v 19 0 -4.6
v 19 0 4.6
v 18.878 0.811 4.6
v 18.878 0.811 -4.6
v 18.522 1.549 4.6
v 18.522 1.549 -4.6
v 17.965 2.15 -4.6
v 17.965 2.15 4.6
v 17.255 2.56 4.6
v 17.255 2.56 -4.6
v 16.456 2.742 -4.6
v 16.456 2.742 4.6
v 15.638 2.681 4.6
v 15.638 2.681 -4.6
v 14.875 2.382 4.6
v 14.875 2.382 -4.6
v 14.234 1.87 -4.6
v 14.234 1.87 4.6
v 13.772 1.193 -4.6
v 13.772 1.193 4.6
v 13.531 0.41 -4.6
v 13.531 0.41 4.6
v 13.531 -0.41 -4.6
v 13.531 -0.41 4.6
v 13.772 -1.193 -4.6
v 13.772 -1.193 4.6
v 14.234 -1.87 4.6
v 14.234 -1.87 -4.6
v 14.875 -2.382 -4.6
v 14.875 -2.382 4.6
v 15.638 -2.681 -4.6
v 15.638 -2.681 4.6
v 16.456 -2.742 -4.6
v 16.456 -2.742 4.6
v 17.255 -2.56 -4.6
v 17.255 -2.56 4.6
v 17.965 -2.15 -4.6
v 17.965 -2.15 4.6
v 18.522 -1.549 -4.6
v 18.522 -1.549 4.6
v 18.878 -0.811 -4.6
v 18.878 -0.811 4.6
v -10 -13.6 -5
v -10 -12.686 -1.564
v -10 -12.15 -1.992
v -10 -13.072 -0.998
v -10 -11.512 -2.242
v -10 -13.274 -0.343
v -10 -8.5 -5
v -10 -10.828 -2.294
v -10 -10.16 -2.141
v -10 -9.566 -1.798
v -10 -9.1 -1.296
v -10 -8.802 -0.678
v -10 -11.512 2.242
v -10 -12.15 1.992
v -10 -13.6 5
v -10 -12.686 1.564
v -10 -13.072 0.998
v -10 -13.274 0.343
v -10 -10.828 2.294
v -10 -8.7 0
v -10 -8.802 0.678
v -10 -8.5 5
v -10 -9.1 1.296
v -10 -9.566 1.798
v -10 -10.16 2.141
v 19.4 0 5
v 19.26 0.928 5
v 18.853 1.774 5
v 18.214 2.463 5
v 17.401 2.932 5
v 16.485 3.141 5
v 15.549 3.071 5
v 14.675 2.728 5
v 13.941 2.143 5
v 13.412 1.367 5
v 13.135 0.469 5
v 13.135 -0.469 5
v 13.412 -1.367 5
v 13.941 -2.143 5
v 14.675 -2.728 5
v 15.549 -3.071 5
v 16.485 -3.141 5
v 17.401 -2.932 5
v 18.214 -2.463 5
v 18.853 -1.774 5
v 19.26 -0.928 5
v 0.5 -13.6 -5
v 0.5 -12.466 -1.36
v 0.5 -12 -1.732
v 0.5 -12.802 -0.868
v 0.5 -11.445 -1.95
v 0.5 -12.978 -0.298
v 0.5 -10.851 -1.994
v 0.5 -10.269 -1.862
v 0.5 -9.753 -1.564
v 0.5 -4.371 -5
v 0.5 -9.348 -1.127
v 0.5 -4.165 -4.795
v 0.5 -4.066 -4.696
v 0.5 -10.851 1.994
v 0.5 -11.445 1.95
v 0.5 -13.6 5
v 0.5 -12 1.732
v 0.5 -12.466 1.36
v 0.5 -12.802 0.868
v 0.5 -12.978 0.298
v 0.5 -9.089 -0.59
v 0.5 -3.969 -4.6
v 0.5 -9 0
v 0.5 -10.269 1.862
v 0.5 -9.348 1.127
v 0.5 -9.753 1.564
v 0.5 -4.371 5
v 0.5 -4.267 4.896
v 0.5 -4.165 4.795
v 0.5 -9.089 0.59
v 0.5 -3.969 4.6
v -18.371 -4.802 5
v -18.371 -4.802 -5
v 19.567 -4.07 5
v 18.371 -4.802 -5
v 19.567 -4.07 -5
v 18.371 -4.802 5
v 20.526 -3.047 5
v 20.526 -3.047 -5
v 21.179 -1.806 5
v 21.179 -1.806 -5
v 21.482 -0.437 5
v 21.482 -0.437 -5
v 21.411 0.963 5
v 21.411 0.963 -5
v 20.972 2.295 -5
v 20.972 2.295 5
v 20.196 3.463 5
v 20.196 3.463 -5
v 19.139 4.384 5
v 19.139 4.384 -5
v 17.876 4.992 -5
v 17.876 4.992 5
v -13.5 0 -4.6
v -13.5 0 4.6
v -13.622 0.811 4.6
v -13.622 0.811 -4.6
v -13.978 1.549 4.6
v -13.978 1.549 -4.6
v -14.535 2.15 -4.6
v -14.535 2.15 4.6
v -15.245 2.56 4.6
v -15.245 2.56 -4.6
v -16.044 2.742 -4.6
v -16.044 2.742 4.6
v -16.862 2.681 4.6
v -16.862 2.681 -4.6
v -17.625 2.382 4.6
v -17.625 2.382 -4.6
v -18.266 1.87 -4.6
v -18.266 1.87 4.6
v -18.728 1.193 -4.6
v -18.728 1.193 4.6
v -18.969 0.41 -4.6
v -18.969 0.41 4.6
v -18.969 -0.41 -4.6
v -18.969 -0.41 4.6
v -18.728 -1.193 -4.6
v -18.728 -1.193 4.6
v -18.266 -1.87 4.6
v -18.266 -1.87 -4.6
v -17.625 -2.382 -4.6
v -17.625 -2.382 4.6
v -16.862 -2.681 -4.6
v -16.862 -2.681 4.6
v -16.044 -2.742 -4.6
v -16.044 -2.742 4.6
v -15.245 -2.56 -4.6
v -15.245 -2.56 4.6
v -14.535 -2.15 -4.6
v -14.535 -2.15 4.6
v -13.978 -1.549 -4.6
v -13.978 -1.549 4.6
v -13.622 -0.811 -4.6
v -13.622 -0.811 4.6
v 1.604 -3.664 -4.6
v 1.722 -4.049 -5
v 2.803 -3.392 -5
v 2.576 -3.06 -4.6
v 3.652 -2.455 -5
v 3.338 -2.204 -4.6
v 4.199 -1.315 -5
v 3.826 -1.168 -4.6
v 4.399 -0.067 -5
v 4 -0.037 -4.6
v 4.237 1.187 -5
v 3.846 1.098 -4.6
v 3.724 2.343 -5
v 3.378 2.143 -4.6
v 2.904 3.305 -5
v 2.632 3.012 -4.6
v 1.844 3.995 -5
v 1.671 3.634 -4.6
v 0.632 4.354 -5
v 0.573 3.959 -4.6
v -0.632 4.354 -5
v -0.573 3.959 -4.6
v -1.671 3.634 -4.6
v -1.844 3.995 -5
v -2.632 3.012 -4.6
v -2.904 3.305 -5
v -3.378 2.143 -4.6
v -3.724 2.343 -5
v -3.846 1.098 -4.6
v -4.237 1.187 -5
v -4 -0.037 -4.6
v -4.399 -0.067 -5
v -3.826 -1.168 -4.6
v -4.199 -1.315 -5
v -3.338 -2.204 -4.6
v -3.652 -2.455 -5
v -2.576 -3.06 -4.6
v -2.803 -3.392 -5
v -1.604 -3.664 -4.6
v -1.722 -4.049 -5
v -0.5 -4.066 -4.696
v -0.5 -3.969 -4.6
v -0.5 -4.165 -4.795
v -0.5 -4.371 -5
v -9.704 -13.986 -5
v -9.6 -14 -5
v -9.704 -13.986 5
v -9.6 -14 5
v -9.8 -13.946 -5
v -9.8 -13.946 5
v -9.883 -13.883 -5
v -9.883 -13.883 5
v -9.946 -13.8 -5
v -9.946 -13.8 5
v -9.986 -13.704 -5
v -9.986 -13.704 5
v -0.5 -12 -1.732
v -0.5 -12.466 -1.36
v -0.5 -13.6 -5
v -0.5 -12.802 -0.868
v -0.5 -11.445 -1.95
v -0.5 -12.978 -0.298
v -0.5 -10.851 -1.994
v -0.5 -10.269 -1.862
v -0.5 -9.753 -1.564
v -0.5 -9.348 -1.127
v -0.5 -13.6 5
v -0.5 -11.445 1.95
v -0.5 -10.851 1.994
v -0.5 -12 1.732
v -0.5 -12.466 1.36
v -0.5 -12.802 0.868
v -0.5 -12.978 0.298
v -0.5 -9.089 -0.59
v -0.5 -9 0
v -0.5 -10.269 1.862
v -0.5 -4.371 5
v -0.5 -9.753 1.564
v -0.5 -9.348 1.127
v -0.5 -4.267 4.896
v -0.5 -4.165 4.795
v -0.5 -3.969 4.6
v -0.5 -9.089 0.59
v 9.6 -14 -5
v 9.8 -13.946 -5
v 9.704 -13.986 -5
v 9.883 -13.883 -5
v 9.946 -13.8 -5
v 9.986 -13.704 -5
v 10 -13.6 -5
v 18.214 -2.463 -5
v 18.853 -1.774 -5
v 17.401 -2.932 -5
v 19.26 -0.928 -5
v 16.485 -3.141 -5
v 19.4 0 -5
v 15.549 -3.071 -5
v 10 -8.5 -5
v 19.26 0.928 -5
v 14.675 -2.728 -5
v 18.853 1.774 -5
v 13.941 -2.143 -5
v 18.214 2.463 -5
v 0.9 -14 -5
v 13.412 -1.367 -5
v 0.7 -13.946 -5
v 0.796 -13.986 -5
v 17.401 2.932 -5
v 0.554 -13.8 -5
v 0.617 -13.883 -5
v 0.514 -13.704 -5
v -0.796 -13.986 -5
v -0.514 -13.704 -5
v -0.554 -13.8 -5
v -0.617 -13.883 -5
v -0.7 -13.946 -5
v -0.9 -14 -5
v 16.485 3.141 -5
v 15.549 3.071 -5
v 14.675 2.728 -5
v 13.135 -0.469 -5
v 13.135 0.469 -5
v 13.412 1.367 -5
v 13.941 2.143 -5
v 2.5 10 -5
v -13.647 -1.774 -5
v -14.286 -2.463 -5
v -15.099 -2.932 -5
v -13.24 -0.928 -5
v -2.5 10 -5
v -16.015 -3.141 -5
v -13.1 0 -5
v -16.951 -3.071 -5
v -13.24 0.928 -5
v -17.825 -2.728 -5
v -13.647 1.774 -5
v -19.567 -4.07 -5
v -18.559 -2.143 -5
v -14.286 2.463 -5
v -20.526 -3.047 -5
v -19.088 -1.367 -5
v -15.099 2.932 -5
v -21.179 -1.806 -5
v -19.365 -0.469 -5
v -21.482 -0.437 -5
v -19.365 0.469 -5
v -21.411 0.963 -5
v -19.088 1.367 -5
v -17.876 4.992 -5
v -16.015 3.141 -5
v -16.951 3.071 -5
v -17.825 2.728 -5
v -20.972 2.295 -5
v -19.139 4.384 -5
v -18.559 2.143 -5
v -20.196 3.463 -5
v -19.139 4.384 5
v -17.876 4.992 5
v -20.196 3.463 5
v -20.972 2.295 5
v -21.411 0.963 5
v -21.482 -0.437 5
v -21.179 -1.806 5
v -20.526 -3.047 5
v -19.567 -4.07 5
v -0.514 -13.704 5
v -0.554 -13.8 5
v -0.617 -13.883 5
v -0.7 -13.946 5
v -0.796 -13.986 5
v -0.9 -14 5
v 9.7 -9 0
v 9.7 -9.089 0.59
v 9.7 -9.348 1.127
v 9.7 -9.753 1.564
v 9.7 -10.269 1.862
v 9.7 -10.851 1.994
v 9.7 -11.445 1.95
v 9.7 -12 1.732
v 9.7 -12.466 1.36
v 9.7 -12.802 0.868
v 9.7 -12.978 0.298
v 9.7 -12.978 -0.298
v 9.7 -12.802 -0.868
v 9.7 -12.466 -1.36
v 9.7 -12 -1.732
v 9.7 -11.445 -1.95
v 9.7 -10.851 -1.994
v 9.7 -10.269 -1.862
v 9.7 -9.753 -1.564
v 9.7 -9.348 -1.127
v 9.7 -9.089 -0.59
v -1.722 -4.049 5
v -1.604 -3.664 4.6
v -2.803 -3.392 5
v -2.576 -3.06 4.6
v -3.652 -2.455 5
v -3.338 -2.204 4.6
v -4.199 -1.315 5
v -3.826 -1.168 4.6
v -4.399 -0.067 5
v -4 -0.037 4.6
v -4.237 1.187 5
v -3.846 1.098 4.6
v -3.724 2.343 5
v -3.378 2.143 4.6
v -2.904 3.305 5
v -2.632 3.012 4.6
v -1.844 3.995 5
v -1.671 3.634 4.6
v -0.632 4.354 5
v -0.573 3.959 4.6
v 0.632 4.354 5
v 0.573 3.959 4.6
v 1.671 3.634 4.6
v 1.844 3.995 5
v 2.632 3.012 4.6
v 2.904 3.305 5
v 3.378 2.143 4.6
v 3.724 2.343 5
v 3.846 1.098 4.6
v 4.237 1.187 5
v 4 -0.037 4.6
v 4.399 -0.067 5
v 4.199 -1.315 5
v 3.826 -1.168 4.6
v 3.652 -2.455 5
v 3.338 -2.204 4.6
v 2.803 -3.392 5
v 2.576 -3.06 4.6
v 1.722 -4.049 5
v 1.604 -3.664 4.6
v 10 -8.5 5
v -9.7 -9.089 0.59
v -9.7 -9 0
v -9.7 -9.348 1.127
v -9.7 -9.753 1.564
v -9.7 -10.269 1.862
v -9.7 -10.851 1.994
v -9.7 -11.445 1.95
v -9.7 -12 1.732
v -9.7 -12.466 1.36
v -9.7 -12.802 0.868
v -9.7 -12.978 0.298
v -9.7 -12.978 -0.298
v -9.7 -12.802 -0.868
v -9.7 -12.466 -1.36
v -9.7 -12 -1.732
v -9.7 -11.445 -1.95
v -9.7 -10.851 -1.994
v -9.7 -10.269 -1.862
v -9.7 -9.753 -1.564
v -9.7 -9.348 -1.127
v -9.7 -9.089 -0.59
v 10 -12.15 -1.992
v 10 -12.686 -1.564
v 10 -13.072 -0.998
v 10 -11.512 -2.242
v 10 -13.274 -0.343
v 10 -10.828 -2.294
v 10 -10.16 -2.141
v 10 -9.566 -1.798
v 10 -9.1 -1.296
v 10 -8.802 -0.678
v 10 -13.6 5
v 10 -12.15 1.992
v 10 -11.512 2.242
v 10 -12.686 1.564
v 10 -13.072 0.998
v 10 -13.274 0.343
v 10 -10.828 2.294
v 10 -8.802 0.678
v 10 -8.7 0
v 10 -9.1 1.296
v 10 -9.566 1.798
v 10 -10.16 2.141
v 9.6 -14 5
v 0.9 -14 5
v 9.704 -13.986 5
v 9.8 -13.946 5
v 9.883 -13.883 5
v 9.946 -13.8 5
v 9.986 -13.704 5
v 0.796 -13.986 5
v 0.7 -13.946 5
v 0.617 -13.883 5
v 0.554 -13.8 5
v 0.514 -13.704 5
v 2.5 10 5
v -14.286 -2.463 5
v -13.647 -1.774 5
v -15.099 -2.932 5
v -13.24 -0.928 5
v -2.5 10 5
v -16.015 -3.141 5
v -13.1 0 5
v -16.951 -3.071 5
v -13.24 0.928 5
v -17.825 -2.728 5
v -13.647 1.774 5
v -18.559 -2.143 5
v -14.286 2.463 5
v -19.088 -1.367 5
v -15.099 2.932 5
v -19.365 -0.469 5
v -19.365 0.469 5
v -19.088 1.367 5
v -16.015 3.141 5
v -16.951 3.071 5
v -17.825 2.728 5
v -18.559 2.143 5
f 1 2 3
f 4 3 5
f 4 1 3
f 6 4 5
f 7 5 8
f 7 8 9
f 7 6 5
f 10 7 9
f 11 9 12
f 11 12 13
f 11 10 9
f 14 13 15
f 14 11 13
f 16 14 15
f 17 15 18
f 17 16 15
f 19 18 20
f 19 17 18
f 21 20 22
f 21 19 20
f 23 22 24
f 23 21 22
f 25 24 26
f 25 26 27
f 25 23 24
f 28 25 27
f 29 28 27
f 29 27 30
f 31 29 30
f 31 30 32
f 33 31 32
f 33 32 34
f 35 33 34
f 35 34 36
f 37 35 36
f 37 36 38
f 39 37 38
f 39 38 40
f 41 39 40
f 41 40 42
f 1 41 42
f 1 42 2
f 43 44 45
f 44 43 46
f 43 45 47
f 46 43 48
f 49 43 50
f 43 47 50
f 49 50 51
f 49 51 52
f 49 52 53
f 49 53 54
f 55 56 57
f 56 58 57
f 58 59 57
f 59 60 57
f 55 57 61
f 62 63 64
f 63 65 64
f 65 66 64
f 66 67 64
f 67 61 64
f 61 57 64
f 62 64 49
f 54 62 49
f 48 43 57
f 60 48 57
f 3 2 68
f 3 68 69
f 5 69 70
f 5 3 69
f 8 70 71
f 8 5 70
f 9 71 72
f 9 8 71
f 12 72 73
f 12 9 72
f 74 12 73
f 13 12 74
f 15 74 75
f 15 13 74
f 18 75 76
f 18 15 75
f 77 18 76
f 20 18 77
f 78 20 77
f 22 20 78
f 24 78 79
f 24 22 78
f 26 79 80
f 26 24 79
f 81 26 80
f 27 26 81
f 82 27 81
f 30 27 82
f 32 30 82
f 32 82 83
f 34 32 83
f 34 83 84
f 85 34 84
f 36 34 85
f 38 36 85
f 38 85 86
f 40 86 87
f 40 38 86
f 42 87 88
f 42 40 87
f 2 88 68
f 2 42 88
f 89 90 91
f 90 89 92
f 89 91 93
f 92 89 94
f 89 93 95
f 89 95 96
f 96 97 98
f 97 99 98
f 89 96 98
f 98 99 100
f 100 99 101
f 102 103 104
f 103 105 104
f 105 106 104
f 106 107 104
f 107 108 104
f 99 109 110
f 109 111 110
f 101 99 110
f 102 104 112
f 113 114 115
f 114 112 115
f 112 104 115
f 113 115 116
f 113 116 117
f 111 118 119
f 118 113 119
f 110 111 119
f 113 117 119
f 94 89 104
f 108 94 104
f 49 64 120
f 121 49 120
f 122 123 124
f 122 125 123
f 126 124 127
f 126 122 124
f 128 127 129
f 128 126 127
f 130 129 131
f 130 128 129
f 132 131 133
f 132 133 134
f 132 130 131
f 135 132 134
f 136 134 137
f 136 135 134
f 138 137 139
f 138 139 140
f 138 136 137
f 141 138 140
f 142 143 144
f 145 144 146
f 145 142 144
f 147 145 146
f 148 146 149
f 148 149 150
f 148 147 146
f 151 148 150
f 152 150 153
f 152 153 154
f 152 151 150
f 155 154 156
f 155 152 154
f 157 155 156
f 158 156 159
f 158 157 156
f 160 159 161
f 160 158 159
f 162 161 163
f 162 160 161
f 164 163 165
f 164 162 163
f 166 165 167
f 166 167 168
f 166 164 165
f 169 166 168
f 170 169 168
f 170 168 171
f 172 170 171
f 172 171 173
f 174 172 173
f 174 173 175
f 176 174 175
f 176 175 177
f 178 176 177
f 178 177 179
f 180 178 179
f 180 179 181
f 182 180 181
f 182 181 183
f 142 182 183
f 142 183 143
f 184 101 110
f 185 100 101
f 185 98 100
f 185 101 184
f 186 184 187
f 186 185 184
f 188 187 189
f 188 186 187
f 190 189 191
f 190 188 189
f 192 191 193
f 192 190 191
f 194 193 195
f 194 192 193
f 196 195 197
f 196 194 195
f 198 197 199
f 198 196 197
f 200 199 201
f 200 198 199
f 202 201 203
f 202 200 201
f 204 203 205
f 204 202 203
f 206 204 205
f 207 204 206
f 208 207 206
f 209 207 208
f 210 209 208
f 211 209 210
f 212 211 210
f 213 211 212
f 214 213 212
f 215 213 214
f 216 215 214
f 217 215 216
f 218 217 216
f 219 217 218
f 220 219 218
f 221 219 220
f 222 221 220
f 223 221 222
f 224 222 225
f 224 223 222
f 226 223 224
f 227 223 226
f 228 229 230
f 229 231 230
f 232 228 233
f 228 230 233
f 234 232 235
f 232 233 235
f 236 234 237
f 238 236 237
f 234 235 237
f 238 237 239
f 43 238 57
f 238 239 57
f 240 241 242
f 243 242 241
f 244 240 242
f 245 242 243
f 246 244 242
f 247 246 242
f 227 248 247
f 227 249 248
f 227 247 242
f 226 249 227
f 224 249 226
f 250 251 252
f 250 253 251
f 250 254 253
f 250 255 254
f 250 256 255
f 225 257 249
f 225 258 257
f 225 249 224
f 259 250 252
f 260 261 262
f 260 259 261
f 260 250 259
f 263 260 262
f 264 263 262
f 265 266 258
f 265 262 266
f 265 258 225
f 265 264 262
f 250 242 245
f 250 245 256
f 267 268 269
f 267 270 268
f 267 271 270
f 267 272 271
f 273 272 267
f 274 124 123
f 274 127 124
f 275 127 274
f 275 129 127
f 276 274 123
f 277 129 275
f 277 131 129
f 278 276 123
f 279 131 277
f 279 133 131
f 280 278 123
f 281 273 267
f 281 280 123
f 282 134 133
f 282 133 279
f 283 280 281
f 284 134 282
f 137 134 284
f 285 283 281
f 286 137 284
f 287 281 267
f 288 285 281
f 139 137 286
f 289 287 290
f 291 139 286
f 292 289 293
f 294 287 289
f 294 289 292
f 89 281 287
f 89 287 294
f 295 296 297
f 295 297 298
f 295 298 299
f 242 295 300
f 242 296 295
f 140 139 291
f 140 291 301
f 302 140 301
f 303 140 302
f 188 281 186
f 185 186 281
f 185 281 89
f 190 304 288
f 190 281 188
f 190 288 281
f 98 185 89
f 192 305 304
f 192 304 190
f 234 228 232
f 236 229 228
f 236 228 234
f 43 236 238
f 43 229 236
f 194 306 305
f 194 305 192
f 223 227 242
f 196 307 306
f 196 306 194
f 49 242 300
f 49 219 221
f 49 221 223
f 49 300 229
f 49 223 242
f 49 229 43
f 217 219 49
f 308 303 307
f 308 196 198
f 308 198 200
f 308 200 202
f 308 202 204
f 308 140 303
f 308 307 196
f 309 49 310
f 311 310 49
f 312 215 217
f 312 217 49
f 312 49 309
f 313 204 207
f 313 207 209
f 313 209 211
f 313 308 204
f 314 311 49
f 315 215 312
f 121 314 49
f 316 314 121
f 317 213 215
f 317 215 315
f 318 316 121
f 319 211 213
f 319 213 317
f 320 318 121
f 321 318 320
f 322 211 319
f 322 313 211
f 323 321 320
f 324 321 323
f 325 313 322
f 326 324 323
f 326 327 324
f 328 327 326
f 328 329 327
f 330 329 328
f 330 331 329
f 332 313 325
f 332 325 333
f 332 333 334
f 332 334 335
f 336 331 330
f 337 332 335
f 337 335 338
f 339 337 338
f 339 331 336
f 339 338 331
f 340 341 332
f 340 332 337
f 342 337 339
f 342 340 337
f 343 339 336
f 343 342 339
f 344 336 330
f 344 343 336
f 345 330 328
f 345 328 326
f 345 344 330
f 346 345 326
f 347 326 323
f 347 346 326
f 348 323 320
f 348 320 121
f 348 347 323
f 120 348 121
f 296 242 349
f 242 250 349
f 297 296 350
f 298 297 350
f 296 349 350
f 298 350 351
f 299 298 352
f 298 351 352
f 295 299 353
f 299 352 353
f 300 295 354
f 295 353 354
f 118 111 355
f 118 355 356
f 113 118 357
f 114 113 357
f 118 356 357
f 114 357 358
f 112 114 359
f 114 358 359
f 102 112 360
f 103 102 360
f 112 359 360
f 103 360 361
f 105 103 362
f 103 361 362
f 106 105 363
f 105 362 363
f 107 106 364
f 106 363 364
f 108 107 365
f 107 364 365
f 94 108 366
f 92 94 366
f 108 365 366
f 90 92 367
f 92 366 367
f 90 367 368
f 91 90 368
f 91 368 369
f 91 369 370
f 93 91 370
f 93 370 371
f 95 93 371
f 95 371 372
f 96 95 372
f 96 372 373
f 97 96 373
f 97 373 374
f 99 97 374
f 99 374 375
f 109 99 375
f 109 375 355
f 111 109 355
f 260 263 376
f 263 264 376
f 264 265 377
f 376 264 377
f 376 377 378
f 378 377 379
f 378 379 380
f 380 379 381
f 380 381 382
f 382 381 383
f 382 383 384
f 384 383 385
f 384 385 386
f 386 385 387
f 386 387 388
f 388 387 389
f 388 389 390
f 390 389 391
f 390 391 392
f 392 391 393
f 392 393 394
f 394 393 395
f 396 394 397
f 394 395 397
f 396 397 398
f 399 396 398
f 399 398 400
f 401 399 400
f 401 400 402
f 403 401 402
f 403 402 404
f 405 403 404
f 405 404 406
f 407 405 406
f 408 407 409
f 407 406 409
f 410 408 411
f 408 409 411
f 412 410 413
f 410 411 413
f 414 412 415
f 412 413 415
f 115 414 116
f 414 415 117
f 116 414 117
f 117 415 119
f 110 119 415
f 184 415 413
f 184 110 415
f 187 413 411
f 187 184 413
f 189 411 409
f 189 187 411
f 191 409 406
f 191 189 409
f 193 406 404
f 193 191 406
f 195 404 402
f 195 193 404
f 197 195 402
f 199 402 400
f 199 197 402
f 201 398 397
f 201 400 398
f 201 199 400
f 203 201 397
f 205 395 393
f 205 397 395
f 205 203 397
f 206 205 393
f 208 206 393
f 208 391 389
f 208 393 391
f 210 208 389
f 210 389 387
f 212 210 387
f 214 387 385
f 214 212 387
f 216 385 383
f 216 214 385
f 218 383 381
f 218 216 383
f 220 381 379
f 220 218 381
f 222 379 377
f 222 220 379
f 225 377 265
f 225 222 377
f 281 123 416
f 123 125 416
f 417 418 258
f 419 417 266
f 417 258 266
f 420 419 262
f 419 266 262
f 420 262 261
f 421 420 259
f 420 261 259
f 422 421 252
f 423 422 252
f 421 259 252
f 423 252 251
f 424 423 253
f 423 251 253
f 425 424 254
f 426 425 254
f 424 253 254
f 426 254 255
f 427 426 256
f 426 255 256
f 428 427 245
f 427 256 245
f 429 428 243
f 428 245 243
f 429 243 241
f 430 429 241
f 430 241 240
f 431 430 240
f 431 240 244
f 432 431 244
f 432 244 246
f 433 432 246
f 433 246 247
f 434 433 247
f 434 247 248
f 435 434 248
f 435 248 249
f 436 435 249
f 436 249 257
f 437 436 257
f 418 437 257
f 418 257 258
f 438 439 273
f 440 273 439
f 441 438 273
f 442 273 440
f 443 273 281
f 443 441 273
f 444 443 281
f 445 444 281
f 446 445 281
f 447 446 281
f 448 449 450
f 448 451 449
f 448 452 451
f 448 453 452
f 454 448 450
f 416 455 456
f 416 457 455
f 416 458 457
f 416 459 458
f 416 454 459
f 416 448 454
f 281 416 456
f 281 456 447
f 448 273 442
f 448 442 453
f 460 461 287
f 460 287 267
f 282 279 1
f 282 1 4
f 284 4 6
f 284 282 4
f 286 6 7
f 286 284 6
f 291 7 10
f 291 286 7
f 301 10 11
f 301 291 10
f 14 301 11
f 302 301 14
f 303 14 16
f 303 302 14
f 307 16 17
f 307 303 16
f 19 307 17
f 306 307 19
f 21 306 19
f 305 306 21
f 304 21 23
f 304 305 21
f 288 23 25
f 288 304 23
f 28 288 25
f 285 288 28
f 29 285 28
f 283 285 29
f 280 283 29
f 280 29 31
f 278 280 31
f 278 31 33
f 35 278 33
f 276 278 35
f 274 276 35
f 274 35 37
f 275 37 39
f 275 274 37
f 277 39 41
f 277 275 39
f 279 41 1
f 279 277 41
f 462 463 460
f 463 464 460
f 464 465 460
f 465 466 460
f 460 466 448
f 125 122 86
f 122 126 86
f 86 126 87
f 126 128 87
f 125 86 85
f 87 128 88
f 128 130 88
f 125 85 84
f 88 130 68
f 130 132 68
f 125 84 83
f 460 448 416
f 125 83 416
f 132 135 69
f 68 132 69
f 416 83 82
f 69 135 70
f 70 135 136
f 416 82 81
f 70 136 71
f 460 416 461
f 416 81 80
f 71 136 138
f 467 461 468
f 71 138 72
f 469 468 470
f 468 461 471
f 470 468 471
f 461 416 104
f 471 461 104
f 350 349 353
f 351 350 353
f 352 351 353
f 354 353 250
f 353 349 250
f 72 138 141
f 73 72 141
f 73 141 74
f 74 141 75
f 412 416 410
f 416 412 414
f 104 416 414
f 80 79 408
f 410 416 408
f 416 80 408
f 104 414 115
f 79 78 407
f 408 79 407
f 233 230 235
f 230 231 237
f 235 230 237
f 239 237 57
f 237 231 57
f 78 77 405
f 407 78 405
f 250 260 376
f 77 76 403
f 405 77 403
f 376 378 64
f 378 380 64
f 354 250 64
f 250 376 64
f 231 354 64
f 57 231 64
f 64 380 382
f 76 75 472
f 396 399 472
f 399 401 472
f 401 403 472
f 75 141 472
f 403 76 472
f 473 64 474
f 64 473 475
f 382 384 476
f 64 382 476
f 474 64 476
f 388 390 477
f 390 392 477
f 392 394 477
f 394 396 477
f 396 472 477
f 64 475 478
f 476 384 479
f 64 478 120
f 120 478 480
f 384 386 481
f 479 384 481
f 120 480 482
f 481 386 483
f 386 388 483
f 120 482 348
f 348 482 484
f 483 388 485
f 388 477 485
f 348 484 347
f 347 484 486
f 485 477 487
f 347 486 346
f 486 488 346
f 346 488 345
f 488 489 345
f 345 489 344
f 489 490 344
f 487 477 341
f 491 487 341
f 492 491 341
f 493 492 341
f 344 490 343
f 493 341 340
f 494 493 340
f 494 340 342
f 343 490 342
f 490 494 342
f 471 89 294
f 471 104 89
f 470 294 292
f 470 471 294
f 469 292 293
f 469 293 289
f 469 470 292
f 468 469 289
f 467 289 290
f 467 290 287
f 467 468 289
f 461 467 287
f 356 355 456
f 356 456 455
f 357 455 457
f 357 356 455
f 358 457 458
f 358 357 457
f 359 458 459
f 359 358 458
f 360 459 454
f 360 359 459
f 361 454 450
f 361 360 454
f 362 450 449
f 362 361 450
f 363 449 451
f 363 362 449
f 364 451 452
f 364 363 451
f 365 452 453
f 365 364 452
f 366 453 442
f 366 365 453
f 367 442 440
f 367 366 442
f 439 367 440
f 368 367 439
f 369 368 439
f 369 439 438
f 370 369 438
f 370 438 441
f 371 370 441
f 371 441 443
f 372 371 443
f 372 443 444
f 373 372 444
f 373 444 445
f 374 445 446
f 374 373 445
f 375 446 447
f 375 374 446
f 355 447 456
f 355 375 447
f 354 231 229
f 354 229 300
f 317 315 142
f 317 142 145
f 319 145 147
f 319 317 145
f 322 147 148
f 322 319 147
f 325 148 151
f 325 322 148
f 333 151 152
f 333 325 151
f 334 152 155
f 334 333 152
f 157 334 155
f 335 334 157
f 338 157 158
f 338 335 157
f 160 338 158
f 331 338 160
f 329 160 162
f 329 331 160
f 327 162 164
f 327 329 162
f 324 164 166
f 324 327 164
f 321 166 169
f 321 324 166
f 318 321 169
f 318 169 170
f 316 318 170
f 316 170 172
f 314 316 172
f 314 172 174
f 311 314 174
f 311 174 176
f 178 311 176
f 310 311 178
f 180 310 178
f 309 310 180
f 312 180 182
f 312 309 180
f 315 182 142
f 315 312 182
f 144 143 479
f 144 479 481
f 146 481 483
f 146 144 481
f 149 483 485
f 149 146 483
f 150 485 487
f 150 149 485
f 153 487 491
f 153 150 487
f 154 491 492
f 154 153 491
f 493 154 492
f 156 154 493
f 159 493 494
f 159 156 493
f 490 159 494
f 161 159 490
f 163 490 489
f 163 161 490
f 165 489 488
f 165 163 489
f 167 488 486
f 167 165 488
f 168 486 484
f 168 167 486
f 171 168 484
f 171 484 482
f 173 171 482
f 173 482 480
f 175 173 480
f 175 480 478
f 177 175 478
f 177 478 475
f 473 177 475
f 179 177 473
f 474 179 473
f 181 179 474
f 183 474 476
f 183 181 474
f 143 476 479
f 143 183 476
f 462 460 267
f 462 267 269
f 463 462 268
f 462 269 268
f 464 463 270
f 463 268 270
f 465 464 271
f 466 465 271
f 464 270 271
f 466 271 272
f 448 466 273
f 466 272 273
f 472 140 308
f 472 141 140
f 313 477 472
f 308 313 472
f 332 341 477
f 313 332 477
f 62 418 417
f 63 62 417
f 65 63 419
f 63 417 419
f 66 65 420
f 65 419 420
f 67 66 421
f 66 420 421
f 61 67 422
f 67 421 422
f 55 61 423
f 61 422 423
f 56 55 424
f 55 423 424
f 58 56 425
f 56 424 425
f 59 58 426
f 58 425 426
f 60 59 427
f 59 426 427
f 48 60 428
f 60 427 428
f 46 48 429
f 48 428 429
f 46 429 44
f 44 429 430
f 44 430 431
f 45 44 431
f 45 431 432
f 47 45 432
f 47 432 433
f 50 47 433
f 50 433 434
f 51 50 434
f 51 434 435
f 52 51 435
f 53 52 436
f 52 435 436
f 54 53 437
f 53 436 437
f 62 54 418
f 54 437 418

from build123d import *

# Parameters (mm, degrees)
SKETCH_R        = 4
SKETCH_R_2      = 2.75
PAD_DEPTH       = 5
SKETCH001_W     = 1
SKETCH001_H     = 12
POCKET_DEPTH    = 10.001
CHAMFER_SIZE    = 0.4
FILLET_R        = 0.4
SKETCH002_R     = 2
POCKET001_DEPTH = 31.501
CHAMFER001_SIZE = 0.3


with BuildPart() as part:
    # Sketch → Pad (new body, symmetric)
    with BuildSketch(Plane.XY):
        with BuildLine():
            Line((-2.5, 10), (2.5, 10))
            Line((17.875915, 4.991883), (2.5, 10))
            ThreePointArc((18.371237, -4.80238), (21.493299, 0.265167), (17.875915, 4.991883))
            Line((18.371237, -4.80238), (10, -8.5))
            Line((10, -14), (10, -8.5))
            Line((-10, -14), (10, -14))
            Line((-10, -14), (-10, -8.5))
            Line((-10, -8.5), (-18.371237, -4.80238))
            ThreePointArc((-17.875915, 4.991883), (-21.493299, 0.265167), (-18.371237, -4.80238))
            Line((-17.875915, 4.991883), (-2.5, 10))
        make_face()
        Circle(SKETCH_R, mode=Mode.SUBTRACT)
        with Locations((16.25, 0)):
            Circle(SKETCH_R_2, mode=Mode.SUBTRACT)
        with Locations((-16.25, 0)):
            Circle(SKETCH_R_2, mode=Mode.SUBTRACT)
    extrude(amount=PAD_DEPTH, both=True)

    # Sketch001 (on Face15 of Pad) → Pocket (cut, through all)
    with BuildSketch(Plane.XY.offset(5)):
        with Locations((0, -9)):
            Rectangle(SKETCH001_W, SKETCH001_H)
    extrude(amount=-POCKET_DEPTH, mode=Mode.SUBTRACT)

    # Chamfer
    chamfer_edges = [part.edges().sort_by_distance(p)[0] for p in [
        (-19, 0, 5),
        (13.5, 0, 5),
        (-19, 0, -5),
        (13.5, 0, -5),
        (-2.645751, 3, -5),
        (-2.645751, 3, 5),
    ]]
    chamfer(chamfer_edges, length=CHAMFER_SIZE)

    # Fillet
    fillet_edges = [part.edges().sort_by_distance(p)[0] for p in [
        (10, -14, 0),
        (0.5, -14, 0),
        (-0.5, -14, 0),
        (-10, -14, 0),
    ]]
    fillet(fillet_edges, radius=FILLET_R)

    # Sketch002 (on Face16 of Fillet) → Pocket001 (cut, through all)
    with BuildSketch(Plane.YZ.offset(10)):
        with Locations((-11, 0)):
            Circle(SKETCH002_R)
    extrude(amount=-POCKET001_DEPTH, mode=Mode.SUBTRACT)

    # Chamfer001
    chamfer001_edges = [part.edges().sort_by_distance(p)[0] for p in [
        (10, -13, 0),
        (-10, -13, 0),
    ]]
    chamfer(chamfer001_edges, length=CHAMFER001_SIZE)


solid = part.part
